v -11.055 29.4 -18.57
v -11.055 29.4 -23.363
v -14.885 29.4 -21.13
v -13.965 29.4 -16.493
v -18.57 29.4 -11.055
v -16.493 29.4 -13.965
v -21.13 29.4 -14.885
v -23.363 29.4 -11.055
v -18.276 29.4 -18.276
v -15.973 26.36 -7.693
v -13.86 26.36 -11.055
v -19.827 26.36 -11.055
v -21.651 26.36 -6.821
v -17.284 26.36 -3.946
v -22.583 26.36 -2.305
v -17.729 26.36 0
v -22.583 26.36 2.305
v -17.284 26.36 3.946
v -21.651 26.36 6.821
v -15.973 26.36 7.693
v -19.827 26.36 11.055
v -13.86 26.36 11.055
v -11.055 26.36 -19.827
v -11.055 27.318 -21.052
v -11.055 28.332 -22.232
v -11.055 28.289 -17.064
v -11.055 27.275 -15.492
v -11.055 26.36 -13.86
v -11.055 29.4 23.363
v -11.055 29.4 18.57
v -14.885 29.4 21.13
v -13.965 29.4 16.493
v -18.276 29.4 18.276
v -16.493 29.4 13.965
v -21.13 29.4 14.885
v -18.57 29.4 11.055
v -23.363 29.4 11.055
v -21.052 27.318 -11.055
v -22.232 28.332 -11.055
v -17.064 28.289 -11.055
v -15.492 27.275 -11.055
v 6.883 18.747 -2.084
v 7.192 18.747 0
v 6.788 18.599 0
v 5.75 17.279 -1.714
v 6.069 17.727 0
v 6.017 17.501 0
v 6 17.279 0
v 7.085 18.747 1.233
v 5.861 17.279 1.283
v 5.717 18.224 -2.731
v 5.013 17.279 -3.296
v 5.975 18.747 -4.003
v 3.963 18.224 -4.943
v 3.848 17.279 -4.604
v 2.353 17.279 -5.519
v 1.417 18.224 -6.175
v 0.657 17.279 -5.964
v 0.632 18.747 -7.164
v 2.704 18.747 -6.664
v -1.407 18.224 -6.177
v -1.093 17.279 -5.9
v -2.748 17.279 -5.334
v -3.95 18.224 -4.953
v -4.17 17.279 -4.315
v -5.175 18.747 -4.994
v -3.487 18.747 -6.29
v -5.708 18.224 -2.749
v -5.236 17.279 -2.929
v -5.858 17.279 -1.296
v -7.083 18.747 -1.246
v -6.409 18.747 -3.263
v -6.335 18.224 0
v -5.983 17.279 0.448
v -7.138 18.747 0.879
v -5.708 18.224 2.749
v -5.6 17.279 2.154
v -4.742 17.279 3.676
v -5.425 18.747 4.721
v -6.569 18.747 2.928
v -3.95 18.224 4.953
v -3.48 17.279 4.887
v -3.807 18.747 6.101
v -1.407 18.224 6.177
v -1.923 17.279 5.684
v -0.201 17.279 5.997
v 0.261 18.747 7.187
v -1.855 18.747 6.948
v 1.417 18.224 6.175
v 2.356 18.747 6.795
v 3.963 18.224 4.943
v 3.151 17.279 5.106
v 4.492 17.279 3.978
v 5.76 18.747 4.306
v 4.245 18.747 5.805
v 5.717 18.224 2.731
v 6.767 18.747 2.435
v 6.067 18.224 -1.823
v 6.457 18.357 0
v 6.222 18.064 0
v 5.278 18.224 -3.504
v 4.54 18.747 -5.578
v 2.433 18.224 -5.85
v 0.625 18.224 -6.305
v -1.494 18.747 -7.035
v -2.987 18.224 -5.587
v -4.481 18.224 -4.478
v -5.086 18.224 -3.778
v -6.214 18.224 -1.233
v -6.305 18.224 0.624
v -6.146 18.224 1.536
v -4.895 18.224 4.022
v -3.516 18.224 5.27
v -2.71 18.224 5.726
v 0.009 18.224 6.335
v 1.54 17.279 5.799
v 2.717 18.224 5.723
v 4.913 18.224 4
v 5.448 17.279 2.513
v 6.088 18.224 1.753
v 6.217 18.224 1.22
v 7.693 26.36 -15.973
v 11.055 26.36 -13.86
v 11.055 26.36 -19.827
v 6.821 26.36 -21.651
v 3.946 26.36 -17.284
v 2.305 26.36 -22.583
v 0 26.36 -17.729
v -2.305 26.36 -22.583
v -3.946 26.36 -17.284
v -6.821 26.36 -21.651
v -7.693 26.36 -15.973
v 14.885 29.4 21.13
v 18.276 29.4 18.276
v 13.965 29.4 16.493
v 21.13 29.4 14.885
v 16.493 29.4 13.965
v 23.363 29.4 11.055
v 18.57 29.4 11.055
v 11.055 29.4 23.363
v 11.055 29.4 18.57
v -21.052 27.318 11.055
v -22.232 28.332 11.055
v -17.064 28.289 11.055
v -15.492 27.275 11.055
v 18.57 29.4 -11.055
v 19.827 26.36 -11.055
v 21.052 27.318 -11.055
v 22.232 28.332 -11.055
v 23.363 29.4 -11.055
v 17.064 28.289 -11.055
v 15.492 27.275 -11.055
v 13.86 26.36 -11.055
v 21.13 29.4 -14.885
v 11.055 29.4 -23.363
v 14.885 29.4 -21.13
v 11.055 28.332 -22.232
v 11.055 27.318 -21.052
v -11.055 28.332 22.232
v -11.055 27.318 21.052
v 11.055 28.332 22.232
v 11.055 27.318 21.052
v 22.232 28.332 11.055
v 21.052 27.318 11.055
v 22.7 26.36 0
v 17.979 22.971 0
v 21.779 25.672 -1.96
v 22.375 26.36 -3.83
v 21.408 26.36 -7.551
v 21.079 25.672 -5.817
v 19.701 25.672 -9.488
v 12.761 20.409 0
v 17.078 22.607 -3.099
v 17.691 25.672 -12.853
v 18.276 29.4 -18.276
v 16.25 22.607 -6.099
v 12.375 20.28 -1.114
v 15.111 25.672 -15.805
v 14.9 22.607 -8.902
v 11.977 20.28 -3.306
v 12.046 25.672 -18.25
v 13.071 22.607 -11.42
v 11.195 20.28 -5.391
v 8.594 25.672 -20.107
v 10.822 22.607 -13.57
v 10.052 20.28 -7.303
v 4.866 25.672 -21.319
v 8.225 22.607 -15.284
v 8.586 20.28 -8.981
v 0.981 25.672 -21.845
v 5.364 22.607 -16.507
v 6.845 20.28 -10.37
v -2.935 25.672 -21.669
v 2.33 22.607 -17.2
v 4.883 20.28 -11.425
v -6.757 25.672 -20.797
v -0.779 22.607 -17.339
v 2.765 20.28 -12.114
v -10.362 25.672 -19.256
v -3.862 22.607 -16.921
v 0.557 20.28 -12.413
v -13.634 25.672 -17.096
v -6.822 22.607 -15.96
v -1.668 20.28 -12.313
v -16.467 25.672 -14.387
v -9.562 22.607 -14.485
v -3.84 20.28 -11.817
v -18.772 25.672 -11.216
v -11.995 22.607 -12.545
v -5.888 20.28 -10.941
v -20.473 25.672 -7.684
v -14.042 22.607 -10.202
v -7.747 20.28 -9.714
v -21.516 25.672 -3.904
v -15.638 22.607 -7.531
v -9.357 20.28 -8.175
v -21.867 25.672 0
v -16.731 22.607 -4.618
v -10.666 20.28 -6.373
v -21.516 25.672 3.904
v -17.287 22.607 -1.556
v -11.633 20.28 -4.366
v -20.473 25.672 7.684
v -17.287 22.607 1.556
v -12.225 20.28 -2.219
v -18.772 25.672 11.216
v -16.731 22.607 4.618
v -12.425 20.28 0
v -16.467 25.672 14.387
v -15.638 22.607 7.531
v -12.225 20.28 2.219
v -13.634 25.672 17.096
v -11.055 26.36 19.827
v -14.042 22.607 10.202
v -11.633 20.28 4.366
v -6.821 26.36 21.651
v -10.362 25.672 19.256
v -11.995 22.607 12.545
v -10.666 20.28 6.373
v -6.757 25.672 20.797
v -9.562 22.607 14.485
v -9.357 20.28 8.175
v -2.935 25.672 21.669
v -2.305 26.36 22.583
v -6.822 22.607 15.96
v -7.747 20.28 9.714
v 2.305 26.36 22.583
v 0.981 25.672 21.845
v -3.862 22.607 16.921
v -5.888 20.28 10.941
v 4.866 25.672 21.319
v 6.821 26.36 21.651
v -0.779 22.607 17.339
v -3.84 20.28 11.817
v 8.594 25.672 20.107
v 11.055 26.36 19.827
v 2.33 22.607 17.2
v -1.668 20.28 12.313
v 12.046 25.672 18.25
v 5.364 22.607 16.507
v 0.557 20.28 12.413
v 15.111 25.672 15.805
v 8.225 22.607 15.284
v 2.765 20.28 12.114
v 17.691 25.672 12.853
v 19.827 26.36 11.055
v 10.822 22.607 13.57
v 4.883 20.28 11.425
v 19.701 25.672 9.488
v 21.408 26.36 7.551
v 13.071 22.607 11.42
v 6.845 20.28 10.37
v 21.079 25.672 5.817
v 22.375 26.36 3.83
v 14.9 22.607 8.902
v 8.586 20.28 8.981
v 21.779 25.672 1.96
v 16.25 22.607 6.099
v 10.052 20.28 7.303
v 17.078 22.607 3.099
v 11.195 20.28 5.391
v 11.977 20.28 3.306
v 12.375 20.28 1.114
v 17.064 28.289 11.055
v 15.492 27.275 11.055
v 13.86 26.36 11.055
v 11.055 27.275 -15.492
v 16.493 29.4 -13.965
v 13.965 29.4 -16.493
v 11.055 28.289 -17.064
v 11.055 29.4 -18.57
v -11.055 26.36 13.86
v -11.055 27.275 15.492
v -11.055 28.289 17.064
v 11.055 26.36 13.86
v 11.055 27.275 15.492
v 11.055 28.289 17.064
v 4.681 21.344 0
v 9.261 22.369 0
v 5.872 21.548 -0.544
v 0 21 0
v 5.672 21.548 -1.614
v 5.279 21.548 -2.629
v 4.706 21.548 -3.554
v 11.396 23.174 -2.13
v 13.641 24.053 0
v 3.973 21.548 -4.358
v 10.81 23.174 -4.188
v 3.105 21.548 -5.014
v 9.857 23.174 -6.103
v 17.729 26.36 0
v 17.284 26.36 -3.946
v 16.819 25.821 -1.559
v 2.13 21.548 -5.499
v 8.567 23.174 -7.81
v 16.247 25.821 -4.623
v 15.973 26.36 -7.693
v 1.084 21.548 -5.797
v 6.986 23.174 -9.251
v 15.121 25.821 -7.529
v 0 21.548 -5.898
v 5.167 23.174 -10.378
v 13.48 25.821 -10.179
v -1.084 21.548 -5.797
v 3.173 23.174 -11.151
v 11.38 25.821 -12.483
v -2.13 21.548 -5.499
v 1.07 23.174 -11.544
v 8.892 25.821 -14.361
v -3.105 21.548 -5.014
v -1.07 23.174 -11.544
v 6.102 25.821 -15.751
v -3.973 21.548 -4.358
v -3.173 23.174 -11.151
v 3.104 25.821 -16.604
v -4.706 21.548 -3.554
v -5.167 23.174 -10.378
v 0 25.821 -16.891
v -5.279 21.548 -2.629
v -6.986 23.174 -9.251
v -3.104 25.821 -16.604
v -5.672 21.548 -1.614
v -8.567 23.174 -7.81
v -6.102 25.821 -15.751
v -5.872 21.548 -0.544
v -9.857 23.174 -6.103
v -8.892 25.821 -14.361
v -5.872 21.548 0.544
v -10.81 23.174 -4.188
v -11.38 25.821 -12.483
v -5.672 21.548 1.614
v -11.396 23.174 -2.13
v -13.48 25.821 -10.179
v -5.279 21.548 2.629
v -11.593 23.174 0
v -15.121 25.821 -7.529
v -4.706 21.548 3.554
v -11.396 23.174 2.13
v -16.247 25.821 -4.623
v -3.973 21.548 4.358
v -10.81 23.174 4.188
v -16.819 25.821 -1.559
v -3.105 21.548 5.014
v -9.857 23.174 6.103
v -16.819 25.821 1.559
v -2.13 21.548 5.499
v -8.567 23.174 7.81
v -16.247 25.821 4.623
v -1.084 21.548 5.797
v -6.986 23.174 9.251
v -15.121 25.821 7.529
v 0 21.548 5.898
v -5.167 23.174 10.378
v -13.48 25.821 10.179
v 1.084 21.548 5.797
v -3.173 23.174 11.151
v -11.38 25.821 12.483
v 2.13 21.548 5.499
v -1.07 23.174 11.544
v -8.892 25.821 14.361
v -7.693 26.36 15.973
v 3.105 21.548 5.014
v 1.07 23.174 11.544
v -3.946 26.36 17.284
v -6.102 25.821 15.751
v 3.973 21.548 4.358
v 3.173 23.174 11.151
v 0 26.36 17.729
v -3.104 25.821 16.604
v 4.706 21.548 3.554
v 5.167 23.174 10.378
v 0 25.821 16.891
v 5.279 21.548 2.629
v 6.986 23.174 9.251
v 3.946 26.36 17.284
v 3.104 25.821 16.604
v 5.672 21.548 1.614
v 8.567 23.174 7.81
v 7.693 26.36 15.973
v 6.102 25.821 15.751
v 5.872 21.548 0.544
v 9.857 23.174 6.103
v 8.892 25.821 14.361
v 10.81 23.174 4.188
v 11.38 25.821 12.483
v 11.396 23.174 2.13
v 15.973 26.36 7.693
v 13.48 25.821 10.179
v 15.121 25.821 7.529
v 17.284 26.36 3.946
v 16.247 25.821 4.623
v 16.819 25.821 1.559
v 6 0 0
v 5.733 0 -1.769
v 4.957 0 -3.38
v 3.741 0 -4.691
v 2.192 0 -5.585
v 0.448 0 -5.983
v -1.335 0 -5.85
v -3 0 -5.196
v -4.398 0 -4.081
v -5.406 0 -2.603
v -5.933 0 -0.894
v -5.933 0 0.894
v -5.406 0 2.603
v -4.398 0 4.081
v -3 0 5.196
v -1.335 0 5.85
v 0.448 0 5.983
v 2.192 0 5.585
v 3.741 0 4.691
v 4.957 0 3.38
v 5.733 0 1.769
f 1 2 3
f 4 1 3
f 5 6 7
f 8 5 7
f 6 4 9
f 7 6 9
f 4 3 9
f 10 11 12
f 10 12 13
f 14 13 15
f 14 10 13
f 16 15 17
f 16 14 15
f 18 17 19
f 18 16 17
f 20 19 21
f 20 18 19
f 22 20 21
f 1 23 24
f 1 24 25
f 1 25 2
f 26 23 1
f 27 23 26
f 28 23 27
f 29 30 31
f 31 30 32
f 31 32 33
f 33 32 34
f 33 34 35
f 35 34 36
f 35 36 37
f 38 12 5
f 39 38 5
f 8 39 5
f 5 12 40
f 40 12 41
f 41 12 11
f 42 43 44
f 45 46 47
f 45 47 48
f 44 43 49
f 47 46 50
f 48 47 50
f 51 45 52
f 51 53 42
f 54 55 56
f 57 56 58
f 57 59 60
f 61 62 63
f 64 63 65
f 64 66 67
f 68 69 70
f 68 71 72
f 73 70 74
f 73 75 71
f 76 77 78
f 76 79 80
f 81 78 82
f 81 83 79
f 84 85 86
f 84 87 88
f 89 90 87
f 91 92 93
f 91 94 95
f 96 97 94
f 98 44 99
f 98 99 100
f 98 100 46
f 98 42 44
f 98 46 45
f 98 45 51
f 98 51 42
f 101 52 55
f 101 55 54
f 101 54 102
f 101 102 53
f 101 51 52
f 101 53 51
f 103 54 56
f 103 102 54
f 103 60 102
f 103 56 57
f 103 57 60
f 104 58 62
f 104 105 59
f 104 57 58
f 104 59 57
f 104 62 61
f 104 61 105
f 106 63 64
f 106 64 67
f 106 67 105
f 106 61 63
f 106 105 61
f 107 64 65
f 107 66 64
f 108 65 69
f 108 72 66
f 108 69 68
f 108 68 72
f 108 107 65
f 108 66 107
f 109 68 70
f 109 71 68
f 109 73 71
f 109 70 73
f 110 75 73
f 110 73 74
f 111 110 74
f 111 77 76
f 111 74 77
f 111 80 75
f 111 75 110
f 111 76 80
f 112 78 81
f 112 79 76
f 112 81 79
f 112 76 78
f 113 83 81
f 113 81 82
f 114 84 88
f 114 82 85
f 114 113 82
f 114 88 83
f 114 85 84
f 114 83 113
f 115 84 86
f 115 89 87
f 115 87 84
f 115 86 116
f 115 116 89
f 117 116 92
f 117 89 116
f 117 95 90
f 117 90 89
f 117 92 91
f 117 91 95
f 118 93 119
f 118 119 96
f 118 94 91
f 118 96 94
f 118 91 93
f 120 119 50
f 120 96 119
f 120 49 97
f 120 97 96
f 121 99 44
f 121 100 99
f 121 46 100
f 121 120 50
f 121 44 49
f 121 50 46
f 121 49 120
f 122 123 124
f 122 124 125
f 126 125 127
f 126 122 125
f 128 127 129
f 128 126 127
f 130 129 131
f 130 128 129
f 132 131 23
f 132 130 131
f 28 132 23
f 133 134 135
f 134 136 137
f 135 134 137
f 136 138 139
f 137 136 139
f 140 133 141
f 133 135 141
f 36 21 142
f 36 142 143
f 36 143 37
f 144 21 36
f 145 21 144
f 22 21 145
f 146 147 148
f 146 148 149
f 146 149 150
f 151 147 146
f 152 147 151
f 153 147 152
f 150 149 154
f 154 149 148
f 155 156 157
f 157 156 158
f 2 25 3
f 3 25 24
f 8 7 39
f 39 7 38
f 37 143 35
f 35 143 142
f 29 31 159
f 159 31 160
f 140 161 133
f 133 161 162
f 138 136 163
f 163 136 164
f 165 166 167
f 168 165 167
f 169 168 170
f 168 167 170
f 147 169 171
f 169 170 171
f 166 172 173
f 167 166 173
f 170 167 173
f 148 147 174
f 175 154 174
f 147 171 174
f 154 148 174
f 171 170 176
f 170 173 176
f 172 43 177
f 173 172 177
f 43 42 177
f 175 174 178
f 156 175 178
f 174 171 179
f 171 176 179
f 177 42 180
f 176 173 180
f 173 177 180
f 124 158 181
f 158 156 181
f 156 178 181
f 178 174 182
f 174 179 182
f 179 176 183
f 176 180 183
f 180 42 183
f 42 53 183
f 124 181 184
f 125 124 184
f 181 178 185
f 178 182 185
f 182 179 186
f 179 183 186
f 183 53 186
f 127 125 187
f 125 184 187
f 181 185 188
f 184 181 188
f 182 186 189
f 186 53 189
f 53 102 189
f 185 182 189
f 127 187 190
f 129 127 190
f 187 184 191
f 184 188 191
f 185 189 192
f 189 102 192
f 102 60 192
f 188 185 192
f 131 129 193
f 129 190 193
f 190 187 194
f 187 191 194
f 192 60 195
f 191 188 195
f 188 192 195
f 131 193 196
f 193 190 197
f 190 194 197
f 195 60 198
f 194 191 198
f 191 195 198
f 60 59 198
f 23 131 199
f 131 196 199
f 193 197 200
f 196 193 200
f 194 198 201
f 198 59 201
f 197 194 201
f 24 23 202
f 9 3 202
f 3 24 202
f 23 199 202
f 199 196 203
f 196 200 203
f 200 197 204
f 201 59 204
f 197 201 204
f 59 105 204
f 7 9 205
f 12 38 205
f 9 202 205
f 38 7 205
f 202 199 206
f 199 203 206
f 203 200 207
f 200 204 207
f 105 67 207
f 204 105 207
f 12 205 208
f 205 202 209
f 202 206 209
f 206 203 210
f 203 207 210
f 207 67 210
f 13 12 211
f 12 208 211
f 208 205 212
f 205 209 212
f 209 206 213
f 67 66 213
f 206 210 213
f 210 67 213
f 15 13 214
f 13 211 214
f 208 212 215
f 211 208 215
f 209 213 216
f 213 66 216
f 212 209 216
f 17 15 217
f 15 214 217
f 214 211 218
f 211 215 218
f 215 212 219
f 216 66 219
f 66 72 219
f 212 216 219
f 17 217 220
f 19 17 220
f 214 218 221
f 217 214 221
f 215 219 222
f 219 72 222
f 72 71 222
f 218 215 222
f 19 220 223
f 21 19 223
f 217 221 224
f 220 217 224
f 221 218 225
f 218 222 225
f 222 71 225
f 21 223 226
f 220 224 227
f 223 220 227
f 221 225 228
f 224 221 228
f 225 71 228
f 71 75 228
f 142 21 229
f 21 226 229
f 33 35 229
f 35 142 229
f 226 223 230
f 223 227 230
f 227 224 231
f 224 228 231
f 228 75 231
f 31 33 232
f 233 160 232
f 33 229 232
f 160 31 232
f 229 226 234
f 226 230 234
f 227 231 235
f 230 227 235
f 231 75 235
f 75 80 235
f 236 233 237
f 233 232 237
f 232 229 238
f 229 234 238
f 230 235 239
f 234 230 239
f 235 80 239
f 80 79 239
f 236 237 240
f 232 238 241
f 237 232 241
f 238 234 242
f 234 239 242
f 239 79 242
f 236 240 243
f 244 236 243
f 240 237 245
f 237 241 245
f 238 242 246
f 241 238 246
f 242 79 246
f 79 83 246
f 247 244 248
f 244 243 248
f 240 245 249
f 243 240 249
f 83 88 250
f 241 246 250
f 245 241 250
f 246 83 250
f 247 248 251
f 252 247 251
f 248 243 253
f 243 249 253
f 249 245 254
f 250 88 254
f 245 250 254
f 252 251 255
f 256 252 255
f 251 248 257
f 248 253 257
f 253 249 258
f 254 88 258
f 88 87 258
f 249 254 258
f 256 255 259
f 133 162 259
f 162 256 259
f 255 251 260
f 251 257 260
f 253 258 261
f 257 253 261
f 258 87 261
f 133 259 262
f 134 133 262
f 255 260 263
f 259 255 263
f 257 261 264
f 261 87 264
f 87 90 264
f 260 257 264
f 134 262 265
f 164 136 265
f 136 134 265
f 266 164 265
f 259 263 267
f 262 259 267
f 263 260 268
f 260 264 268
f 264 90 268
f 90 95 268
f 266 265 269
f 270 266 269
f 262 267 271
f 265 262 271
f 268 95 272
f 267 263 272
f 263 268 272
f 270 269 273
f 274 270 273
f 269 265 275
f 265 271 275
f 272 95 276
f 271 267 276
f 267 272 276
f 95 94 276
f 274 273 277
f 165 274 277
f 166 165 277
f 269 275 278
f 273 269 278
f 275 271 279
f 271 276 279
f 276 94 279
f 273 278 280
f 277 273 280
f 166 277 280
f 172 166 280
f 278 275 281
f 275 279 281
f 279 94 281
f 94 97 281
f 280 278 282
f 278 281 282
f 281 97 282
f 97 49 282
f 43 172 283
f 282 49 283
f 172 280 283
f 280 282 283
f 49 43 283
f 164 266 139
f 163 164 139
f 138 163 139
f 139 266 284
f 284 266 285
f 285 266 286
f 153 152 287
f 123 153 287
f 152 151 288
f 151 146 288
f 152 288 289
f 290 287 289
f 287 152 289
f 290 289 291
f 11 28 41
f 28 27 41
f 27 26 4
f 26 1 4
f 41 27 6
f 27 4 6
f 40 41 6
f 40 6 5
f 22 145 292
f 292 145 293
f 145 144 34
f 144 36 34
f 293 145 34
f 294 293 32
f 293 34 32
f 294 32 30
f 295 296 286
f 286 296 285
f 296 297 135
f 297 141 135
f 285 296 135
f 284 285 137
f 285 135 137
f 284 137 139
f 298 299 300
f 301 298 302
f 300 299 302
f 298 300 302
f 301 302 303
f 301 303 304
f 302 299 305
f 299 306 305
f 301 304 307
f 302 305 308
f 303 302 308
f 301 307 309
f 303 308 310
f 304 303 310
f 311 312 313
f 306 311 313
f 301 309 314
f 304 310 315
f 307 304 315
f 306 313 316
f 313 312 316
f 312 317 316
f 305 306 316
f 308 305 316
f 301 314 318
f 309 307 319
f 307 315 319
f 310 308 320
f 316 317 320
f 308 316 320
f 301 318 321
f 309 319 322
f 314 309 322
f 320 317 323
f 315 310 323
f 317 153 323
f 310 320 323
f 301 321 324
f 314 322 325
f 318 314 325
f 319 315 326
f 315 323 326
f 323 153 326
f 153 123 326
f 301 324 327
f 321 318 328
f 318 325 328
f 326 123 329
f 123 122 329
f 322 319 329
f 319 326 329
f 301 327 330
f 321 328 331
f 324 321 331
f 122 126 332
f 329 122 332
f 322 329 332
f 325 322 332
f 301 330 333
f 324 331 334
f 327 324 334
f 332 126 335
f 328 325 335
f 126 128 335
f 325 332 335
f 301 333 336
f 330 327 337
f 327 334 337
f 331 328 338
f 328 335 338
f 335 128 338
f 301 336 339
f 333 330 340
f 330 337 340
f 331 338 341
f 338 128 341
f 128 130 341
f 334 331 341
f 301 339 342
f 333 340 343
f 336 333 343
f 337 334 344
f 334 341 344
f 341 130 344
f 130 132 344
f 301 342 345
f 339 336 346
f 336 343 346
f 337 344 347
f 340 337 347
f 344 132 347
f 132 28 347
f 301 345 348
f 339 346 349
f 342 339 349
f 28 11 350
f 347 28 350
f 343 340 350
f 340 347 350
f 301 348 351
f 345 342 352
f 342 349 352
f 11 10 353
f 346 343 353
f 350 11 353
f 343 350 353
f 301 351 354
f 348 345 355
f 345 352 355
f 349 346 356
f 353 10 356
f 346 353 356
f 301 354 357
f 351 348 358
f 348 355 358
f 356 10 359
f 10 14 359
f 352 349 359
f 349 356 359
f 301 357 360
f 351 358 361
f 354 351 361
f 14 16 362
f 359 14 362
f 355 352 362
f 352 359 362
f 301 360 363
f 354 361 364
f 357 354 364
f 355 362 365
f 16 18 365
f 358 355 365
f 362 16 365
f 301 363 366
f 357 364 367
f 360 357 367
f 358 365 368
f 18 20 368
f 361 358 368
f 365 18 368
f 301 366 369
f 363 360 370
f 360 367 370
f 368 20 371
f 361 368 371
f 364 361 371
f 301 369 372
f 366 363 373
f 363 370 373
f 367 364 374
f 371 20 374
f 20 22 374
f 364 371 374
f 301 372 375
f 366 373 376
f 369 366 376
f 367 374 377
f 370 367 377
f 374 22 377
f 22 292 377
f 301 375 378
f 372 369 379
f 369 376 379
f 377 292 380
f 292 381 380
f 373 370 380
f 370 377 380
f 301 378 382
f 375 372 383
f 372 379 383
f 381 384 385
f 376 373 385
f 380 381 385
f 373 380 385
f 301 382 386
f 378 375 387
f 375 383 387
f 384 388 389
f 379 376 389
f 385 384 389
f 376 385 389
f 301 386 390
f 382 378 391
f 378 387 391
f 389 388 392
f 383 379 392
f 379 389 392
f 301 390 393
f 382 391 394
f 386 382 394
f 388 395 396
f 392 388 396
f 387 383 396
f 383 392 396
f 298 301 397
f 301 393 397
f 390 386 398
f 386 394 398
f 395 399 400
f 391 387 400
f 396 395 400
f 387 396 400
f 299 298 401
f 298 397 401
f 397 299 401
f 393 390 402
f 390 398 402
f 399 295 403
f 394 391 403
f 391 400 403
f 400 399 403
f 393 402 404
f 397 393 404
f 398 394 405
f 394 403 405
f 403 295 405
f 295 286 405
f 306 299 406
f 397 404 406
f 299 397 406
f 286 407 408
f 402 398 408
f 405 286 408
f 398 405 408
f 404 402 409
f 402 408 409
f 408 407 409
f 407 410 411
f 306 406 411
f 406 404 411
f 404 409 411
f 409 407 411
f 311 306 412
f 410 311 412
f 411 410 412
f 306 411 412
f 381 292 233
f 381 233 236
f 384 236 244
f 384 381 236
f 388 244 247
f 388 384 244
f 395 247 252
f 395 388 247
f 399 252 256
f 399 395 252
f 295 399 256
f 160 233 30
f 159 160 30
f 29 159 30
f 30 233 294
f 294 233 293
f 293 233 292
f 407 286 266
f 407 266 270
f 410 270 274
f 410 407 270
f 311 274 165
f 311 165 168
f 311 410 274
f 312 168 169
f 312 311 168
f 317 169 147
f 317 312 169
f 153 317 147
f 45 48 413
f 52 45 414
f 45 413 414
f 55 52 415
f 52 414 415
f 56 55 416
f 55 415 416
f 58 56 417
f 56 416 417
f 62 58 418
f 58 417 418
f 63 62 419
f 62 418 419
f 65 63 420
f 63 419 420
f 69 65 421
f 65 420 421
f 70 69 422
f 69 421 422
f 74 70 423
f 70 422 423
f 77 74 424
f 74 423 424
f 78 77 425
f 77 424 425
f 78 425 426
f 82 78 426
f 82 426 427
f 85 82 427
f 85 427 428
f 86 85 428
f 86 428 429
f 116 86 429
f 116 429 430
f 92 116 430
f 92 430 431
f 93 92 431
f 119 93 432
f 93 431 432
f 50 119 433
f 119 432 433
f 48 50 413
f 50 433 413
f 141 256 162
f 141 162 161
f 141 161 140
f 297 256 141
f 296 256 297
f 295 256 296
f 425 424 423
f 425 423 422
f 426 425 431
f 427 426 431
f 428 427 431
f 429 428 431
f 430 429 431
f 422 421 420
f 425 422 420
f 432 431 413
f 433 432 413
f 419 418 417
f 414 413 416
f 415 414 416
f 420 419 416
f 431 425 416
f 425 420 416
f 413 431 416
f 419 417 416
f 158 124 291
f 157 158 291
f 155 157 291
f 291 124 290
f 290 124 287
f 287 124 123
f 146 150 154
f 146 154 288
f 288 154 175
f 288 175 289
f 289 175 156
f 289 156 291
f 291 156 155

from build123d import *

# Parameters (mm, degrees)
CUT_EXTRUDE1_START = -10
SKETCH2_W          = 22.11
SKETCH2_H          = 3.04
CUT_EXTRUDE1_DEPTH = 57.908847779
CIRPATTERN1_COUNT  = 4
FILLET1_R          = 1.5


with BuildPart() as part:
    # Sketch1 → Revolve1 (revolve)
    with BuildSketch(Plane.XY):
        with BuildLine():
            Line((0, 0), (0, 21))
            ThreePointArc((0, 21), (11.593101397, 23.173836988), (21.611108255, 29.4))
            Line((21.611108255, 29.4), (25.846469778, 29.4))
            ThreePointArc((25.846469778, 29.4), (16.827157621, 22.310477905), (6, 18.518120701))
            Line((6, 18.518120701), (6, 0))
            Line((6, 0), (0, 0))
        make_face()
    revolve(axis=Axis((0, 0, 0), (0, 1, 0)))

    # Sketch2 → Cut-Extrude1 (cut)
    with BuildSketch(Plane.XY.offset(CUT_EXTRUDE1_START)):
        with Locations((0, 27.88)):
            Rectangle(SKETCH2_W, SKETCH2_H)
    cut_extrude1 = extrude(amount=CUT_EXTRUDE1_DEPTH, mode=Mode.SUBTRACT)

    # CirPattern1: Cut-Extrude1 ×4 about axis
    cirpattern1_axis = Axis((0, 0, 0), (0, 1, 0))
    for i in range(1, CIRPATTERN1_COUNT):
        add(cut_extrude1.rotate(cirpattern1_axis, i * 360 / CIRPATTERN1_COUNT), mode=Mode.SUBTRACT)

    # Fillet1
    fillet1_edges = [part.edges().sort_by_distance(p)[0] for p in [
        (-6, 18.518120701, 0),
    ]]
    fillet(fillet1_edges, radius=FILLET1_R)


solid = part.part
